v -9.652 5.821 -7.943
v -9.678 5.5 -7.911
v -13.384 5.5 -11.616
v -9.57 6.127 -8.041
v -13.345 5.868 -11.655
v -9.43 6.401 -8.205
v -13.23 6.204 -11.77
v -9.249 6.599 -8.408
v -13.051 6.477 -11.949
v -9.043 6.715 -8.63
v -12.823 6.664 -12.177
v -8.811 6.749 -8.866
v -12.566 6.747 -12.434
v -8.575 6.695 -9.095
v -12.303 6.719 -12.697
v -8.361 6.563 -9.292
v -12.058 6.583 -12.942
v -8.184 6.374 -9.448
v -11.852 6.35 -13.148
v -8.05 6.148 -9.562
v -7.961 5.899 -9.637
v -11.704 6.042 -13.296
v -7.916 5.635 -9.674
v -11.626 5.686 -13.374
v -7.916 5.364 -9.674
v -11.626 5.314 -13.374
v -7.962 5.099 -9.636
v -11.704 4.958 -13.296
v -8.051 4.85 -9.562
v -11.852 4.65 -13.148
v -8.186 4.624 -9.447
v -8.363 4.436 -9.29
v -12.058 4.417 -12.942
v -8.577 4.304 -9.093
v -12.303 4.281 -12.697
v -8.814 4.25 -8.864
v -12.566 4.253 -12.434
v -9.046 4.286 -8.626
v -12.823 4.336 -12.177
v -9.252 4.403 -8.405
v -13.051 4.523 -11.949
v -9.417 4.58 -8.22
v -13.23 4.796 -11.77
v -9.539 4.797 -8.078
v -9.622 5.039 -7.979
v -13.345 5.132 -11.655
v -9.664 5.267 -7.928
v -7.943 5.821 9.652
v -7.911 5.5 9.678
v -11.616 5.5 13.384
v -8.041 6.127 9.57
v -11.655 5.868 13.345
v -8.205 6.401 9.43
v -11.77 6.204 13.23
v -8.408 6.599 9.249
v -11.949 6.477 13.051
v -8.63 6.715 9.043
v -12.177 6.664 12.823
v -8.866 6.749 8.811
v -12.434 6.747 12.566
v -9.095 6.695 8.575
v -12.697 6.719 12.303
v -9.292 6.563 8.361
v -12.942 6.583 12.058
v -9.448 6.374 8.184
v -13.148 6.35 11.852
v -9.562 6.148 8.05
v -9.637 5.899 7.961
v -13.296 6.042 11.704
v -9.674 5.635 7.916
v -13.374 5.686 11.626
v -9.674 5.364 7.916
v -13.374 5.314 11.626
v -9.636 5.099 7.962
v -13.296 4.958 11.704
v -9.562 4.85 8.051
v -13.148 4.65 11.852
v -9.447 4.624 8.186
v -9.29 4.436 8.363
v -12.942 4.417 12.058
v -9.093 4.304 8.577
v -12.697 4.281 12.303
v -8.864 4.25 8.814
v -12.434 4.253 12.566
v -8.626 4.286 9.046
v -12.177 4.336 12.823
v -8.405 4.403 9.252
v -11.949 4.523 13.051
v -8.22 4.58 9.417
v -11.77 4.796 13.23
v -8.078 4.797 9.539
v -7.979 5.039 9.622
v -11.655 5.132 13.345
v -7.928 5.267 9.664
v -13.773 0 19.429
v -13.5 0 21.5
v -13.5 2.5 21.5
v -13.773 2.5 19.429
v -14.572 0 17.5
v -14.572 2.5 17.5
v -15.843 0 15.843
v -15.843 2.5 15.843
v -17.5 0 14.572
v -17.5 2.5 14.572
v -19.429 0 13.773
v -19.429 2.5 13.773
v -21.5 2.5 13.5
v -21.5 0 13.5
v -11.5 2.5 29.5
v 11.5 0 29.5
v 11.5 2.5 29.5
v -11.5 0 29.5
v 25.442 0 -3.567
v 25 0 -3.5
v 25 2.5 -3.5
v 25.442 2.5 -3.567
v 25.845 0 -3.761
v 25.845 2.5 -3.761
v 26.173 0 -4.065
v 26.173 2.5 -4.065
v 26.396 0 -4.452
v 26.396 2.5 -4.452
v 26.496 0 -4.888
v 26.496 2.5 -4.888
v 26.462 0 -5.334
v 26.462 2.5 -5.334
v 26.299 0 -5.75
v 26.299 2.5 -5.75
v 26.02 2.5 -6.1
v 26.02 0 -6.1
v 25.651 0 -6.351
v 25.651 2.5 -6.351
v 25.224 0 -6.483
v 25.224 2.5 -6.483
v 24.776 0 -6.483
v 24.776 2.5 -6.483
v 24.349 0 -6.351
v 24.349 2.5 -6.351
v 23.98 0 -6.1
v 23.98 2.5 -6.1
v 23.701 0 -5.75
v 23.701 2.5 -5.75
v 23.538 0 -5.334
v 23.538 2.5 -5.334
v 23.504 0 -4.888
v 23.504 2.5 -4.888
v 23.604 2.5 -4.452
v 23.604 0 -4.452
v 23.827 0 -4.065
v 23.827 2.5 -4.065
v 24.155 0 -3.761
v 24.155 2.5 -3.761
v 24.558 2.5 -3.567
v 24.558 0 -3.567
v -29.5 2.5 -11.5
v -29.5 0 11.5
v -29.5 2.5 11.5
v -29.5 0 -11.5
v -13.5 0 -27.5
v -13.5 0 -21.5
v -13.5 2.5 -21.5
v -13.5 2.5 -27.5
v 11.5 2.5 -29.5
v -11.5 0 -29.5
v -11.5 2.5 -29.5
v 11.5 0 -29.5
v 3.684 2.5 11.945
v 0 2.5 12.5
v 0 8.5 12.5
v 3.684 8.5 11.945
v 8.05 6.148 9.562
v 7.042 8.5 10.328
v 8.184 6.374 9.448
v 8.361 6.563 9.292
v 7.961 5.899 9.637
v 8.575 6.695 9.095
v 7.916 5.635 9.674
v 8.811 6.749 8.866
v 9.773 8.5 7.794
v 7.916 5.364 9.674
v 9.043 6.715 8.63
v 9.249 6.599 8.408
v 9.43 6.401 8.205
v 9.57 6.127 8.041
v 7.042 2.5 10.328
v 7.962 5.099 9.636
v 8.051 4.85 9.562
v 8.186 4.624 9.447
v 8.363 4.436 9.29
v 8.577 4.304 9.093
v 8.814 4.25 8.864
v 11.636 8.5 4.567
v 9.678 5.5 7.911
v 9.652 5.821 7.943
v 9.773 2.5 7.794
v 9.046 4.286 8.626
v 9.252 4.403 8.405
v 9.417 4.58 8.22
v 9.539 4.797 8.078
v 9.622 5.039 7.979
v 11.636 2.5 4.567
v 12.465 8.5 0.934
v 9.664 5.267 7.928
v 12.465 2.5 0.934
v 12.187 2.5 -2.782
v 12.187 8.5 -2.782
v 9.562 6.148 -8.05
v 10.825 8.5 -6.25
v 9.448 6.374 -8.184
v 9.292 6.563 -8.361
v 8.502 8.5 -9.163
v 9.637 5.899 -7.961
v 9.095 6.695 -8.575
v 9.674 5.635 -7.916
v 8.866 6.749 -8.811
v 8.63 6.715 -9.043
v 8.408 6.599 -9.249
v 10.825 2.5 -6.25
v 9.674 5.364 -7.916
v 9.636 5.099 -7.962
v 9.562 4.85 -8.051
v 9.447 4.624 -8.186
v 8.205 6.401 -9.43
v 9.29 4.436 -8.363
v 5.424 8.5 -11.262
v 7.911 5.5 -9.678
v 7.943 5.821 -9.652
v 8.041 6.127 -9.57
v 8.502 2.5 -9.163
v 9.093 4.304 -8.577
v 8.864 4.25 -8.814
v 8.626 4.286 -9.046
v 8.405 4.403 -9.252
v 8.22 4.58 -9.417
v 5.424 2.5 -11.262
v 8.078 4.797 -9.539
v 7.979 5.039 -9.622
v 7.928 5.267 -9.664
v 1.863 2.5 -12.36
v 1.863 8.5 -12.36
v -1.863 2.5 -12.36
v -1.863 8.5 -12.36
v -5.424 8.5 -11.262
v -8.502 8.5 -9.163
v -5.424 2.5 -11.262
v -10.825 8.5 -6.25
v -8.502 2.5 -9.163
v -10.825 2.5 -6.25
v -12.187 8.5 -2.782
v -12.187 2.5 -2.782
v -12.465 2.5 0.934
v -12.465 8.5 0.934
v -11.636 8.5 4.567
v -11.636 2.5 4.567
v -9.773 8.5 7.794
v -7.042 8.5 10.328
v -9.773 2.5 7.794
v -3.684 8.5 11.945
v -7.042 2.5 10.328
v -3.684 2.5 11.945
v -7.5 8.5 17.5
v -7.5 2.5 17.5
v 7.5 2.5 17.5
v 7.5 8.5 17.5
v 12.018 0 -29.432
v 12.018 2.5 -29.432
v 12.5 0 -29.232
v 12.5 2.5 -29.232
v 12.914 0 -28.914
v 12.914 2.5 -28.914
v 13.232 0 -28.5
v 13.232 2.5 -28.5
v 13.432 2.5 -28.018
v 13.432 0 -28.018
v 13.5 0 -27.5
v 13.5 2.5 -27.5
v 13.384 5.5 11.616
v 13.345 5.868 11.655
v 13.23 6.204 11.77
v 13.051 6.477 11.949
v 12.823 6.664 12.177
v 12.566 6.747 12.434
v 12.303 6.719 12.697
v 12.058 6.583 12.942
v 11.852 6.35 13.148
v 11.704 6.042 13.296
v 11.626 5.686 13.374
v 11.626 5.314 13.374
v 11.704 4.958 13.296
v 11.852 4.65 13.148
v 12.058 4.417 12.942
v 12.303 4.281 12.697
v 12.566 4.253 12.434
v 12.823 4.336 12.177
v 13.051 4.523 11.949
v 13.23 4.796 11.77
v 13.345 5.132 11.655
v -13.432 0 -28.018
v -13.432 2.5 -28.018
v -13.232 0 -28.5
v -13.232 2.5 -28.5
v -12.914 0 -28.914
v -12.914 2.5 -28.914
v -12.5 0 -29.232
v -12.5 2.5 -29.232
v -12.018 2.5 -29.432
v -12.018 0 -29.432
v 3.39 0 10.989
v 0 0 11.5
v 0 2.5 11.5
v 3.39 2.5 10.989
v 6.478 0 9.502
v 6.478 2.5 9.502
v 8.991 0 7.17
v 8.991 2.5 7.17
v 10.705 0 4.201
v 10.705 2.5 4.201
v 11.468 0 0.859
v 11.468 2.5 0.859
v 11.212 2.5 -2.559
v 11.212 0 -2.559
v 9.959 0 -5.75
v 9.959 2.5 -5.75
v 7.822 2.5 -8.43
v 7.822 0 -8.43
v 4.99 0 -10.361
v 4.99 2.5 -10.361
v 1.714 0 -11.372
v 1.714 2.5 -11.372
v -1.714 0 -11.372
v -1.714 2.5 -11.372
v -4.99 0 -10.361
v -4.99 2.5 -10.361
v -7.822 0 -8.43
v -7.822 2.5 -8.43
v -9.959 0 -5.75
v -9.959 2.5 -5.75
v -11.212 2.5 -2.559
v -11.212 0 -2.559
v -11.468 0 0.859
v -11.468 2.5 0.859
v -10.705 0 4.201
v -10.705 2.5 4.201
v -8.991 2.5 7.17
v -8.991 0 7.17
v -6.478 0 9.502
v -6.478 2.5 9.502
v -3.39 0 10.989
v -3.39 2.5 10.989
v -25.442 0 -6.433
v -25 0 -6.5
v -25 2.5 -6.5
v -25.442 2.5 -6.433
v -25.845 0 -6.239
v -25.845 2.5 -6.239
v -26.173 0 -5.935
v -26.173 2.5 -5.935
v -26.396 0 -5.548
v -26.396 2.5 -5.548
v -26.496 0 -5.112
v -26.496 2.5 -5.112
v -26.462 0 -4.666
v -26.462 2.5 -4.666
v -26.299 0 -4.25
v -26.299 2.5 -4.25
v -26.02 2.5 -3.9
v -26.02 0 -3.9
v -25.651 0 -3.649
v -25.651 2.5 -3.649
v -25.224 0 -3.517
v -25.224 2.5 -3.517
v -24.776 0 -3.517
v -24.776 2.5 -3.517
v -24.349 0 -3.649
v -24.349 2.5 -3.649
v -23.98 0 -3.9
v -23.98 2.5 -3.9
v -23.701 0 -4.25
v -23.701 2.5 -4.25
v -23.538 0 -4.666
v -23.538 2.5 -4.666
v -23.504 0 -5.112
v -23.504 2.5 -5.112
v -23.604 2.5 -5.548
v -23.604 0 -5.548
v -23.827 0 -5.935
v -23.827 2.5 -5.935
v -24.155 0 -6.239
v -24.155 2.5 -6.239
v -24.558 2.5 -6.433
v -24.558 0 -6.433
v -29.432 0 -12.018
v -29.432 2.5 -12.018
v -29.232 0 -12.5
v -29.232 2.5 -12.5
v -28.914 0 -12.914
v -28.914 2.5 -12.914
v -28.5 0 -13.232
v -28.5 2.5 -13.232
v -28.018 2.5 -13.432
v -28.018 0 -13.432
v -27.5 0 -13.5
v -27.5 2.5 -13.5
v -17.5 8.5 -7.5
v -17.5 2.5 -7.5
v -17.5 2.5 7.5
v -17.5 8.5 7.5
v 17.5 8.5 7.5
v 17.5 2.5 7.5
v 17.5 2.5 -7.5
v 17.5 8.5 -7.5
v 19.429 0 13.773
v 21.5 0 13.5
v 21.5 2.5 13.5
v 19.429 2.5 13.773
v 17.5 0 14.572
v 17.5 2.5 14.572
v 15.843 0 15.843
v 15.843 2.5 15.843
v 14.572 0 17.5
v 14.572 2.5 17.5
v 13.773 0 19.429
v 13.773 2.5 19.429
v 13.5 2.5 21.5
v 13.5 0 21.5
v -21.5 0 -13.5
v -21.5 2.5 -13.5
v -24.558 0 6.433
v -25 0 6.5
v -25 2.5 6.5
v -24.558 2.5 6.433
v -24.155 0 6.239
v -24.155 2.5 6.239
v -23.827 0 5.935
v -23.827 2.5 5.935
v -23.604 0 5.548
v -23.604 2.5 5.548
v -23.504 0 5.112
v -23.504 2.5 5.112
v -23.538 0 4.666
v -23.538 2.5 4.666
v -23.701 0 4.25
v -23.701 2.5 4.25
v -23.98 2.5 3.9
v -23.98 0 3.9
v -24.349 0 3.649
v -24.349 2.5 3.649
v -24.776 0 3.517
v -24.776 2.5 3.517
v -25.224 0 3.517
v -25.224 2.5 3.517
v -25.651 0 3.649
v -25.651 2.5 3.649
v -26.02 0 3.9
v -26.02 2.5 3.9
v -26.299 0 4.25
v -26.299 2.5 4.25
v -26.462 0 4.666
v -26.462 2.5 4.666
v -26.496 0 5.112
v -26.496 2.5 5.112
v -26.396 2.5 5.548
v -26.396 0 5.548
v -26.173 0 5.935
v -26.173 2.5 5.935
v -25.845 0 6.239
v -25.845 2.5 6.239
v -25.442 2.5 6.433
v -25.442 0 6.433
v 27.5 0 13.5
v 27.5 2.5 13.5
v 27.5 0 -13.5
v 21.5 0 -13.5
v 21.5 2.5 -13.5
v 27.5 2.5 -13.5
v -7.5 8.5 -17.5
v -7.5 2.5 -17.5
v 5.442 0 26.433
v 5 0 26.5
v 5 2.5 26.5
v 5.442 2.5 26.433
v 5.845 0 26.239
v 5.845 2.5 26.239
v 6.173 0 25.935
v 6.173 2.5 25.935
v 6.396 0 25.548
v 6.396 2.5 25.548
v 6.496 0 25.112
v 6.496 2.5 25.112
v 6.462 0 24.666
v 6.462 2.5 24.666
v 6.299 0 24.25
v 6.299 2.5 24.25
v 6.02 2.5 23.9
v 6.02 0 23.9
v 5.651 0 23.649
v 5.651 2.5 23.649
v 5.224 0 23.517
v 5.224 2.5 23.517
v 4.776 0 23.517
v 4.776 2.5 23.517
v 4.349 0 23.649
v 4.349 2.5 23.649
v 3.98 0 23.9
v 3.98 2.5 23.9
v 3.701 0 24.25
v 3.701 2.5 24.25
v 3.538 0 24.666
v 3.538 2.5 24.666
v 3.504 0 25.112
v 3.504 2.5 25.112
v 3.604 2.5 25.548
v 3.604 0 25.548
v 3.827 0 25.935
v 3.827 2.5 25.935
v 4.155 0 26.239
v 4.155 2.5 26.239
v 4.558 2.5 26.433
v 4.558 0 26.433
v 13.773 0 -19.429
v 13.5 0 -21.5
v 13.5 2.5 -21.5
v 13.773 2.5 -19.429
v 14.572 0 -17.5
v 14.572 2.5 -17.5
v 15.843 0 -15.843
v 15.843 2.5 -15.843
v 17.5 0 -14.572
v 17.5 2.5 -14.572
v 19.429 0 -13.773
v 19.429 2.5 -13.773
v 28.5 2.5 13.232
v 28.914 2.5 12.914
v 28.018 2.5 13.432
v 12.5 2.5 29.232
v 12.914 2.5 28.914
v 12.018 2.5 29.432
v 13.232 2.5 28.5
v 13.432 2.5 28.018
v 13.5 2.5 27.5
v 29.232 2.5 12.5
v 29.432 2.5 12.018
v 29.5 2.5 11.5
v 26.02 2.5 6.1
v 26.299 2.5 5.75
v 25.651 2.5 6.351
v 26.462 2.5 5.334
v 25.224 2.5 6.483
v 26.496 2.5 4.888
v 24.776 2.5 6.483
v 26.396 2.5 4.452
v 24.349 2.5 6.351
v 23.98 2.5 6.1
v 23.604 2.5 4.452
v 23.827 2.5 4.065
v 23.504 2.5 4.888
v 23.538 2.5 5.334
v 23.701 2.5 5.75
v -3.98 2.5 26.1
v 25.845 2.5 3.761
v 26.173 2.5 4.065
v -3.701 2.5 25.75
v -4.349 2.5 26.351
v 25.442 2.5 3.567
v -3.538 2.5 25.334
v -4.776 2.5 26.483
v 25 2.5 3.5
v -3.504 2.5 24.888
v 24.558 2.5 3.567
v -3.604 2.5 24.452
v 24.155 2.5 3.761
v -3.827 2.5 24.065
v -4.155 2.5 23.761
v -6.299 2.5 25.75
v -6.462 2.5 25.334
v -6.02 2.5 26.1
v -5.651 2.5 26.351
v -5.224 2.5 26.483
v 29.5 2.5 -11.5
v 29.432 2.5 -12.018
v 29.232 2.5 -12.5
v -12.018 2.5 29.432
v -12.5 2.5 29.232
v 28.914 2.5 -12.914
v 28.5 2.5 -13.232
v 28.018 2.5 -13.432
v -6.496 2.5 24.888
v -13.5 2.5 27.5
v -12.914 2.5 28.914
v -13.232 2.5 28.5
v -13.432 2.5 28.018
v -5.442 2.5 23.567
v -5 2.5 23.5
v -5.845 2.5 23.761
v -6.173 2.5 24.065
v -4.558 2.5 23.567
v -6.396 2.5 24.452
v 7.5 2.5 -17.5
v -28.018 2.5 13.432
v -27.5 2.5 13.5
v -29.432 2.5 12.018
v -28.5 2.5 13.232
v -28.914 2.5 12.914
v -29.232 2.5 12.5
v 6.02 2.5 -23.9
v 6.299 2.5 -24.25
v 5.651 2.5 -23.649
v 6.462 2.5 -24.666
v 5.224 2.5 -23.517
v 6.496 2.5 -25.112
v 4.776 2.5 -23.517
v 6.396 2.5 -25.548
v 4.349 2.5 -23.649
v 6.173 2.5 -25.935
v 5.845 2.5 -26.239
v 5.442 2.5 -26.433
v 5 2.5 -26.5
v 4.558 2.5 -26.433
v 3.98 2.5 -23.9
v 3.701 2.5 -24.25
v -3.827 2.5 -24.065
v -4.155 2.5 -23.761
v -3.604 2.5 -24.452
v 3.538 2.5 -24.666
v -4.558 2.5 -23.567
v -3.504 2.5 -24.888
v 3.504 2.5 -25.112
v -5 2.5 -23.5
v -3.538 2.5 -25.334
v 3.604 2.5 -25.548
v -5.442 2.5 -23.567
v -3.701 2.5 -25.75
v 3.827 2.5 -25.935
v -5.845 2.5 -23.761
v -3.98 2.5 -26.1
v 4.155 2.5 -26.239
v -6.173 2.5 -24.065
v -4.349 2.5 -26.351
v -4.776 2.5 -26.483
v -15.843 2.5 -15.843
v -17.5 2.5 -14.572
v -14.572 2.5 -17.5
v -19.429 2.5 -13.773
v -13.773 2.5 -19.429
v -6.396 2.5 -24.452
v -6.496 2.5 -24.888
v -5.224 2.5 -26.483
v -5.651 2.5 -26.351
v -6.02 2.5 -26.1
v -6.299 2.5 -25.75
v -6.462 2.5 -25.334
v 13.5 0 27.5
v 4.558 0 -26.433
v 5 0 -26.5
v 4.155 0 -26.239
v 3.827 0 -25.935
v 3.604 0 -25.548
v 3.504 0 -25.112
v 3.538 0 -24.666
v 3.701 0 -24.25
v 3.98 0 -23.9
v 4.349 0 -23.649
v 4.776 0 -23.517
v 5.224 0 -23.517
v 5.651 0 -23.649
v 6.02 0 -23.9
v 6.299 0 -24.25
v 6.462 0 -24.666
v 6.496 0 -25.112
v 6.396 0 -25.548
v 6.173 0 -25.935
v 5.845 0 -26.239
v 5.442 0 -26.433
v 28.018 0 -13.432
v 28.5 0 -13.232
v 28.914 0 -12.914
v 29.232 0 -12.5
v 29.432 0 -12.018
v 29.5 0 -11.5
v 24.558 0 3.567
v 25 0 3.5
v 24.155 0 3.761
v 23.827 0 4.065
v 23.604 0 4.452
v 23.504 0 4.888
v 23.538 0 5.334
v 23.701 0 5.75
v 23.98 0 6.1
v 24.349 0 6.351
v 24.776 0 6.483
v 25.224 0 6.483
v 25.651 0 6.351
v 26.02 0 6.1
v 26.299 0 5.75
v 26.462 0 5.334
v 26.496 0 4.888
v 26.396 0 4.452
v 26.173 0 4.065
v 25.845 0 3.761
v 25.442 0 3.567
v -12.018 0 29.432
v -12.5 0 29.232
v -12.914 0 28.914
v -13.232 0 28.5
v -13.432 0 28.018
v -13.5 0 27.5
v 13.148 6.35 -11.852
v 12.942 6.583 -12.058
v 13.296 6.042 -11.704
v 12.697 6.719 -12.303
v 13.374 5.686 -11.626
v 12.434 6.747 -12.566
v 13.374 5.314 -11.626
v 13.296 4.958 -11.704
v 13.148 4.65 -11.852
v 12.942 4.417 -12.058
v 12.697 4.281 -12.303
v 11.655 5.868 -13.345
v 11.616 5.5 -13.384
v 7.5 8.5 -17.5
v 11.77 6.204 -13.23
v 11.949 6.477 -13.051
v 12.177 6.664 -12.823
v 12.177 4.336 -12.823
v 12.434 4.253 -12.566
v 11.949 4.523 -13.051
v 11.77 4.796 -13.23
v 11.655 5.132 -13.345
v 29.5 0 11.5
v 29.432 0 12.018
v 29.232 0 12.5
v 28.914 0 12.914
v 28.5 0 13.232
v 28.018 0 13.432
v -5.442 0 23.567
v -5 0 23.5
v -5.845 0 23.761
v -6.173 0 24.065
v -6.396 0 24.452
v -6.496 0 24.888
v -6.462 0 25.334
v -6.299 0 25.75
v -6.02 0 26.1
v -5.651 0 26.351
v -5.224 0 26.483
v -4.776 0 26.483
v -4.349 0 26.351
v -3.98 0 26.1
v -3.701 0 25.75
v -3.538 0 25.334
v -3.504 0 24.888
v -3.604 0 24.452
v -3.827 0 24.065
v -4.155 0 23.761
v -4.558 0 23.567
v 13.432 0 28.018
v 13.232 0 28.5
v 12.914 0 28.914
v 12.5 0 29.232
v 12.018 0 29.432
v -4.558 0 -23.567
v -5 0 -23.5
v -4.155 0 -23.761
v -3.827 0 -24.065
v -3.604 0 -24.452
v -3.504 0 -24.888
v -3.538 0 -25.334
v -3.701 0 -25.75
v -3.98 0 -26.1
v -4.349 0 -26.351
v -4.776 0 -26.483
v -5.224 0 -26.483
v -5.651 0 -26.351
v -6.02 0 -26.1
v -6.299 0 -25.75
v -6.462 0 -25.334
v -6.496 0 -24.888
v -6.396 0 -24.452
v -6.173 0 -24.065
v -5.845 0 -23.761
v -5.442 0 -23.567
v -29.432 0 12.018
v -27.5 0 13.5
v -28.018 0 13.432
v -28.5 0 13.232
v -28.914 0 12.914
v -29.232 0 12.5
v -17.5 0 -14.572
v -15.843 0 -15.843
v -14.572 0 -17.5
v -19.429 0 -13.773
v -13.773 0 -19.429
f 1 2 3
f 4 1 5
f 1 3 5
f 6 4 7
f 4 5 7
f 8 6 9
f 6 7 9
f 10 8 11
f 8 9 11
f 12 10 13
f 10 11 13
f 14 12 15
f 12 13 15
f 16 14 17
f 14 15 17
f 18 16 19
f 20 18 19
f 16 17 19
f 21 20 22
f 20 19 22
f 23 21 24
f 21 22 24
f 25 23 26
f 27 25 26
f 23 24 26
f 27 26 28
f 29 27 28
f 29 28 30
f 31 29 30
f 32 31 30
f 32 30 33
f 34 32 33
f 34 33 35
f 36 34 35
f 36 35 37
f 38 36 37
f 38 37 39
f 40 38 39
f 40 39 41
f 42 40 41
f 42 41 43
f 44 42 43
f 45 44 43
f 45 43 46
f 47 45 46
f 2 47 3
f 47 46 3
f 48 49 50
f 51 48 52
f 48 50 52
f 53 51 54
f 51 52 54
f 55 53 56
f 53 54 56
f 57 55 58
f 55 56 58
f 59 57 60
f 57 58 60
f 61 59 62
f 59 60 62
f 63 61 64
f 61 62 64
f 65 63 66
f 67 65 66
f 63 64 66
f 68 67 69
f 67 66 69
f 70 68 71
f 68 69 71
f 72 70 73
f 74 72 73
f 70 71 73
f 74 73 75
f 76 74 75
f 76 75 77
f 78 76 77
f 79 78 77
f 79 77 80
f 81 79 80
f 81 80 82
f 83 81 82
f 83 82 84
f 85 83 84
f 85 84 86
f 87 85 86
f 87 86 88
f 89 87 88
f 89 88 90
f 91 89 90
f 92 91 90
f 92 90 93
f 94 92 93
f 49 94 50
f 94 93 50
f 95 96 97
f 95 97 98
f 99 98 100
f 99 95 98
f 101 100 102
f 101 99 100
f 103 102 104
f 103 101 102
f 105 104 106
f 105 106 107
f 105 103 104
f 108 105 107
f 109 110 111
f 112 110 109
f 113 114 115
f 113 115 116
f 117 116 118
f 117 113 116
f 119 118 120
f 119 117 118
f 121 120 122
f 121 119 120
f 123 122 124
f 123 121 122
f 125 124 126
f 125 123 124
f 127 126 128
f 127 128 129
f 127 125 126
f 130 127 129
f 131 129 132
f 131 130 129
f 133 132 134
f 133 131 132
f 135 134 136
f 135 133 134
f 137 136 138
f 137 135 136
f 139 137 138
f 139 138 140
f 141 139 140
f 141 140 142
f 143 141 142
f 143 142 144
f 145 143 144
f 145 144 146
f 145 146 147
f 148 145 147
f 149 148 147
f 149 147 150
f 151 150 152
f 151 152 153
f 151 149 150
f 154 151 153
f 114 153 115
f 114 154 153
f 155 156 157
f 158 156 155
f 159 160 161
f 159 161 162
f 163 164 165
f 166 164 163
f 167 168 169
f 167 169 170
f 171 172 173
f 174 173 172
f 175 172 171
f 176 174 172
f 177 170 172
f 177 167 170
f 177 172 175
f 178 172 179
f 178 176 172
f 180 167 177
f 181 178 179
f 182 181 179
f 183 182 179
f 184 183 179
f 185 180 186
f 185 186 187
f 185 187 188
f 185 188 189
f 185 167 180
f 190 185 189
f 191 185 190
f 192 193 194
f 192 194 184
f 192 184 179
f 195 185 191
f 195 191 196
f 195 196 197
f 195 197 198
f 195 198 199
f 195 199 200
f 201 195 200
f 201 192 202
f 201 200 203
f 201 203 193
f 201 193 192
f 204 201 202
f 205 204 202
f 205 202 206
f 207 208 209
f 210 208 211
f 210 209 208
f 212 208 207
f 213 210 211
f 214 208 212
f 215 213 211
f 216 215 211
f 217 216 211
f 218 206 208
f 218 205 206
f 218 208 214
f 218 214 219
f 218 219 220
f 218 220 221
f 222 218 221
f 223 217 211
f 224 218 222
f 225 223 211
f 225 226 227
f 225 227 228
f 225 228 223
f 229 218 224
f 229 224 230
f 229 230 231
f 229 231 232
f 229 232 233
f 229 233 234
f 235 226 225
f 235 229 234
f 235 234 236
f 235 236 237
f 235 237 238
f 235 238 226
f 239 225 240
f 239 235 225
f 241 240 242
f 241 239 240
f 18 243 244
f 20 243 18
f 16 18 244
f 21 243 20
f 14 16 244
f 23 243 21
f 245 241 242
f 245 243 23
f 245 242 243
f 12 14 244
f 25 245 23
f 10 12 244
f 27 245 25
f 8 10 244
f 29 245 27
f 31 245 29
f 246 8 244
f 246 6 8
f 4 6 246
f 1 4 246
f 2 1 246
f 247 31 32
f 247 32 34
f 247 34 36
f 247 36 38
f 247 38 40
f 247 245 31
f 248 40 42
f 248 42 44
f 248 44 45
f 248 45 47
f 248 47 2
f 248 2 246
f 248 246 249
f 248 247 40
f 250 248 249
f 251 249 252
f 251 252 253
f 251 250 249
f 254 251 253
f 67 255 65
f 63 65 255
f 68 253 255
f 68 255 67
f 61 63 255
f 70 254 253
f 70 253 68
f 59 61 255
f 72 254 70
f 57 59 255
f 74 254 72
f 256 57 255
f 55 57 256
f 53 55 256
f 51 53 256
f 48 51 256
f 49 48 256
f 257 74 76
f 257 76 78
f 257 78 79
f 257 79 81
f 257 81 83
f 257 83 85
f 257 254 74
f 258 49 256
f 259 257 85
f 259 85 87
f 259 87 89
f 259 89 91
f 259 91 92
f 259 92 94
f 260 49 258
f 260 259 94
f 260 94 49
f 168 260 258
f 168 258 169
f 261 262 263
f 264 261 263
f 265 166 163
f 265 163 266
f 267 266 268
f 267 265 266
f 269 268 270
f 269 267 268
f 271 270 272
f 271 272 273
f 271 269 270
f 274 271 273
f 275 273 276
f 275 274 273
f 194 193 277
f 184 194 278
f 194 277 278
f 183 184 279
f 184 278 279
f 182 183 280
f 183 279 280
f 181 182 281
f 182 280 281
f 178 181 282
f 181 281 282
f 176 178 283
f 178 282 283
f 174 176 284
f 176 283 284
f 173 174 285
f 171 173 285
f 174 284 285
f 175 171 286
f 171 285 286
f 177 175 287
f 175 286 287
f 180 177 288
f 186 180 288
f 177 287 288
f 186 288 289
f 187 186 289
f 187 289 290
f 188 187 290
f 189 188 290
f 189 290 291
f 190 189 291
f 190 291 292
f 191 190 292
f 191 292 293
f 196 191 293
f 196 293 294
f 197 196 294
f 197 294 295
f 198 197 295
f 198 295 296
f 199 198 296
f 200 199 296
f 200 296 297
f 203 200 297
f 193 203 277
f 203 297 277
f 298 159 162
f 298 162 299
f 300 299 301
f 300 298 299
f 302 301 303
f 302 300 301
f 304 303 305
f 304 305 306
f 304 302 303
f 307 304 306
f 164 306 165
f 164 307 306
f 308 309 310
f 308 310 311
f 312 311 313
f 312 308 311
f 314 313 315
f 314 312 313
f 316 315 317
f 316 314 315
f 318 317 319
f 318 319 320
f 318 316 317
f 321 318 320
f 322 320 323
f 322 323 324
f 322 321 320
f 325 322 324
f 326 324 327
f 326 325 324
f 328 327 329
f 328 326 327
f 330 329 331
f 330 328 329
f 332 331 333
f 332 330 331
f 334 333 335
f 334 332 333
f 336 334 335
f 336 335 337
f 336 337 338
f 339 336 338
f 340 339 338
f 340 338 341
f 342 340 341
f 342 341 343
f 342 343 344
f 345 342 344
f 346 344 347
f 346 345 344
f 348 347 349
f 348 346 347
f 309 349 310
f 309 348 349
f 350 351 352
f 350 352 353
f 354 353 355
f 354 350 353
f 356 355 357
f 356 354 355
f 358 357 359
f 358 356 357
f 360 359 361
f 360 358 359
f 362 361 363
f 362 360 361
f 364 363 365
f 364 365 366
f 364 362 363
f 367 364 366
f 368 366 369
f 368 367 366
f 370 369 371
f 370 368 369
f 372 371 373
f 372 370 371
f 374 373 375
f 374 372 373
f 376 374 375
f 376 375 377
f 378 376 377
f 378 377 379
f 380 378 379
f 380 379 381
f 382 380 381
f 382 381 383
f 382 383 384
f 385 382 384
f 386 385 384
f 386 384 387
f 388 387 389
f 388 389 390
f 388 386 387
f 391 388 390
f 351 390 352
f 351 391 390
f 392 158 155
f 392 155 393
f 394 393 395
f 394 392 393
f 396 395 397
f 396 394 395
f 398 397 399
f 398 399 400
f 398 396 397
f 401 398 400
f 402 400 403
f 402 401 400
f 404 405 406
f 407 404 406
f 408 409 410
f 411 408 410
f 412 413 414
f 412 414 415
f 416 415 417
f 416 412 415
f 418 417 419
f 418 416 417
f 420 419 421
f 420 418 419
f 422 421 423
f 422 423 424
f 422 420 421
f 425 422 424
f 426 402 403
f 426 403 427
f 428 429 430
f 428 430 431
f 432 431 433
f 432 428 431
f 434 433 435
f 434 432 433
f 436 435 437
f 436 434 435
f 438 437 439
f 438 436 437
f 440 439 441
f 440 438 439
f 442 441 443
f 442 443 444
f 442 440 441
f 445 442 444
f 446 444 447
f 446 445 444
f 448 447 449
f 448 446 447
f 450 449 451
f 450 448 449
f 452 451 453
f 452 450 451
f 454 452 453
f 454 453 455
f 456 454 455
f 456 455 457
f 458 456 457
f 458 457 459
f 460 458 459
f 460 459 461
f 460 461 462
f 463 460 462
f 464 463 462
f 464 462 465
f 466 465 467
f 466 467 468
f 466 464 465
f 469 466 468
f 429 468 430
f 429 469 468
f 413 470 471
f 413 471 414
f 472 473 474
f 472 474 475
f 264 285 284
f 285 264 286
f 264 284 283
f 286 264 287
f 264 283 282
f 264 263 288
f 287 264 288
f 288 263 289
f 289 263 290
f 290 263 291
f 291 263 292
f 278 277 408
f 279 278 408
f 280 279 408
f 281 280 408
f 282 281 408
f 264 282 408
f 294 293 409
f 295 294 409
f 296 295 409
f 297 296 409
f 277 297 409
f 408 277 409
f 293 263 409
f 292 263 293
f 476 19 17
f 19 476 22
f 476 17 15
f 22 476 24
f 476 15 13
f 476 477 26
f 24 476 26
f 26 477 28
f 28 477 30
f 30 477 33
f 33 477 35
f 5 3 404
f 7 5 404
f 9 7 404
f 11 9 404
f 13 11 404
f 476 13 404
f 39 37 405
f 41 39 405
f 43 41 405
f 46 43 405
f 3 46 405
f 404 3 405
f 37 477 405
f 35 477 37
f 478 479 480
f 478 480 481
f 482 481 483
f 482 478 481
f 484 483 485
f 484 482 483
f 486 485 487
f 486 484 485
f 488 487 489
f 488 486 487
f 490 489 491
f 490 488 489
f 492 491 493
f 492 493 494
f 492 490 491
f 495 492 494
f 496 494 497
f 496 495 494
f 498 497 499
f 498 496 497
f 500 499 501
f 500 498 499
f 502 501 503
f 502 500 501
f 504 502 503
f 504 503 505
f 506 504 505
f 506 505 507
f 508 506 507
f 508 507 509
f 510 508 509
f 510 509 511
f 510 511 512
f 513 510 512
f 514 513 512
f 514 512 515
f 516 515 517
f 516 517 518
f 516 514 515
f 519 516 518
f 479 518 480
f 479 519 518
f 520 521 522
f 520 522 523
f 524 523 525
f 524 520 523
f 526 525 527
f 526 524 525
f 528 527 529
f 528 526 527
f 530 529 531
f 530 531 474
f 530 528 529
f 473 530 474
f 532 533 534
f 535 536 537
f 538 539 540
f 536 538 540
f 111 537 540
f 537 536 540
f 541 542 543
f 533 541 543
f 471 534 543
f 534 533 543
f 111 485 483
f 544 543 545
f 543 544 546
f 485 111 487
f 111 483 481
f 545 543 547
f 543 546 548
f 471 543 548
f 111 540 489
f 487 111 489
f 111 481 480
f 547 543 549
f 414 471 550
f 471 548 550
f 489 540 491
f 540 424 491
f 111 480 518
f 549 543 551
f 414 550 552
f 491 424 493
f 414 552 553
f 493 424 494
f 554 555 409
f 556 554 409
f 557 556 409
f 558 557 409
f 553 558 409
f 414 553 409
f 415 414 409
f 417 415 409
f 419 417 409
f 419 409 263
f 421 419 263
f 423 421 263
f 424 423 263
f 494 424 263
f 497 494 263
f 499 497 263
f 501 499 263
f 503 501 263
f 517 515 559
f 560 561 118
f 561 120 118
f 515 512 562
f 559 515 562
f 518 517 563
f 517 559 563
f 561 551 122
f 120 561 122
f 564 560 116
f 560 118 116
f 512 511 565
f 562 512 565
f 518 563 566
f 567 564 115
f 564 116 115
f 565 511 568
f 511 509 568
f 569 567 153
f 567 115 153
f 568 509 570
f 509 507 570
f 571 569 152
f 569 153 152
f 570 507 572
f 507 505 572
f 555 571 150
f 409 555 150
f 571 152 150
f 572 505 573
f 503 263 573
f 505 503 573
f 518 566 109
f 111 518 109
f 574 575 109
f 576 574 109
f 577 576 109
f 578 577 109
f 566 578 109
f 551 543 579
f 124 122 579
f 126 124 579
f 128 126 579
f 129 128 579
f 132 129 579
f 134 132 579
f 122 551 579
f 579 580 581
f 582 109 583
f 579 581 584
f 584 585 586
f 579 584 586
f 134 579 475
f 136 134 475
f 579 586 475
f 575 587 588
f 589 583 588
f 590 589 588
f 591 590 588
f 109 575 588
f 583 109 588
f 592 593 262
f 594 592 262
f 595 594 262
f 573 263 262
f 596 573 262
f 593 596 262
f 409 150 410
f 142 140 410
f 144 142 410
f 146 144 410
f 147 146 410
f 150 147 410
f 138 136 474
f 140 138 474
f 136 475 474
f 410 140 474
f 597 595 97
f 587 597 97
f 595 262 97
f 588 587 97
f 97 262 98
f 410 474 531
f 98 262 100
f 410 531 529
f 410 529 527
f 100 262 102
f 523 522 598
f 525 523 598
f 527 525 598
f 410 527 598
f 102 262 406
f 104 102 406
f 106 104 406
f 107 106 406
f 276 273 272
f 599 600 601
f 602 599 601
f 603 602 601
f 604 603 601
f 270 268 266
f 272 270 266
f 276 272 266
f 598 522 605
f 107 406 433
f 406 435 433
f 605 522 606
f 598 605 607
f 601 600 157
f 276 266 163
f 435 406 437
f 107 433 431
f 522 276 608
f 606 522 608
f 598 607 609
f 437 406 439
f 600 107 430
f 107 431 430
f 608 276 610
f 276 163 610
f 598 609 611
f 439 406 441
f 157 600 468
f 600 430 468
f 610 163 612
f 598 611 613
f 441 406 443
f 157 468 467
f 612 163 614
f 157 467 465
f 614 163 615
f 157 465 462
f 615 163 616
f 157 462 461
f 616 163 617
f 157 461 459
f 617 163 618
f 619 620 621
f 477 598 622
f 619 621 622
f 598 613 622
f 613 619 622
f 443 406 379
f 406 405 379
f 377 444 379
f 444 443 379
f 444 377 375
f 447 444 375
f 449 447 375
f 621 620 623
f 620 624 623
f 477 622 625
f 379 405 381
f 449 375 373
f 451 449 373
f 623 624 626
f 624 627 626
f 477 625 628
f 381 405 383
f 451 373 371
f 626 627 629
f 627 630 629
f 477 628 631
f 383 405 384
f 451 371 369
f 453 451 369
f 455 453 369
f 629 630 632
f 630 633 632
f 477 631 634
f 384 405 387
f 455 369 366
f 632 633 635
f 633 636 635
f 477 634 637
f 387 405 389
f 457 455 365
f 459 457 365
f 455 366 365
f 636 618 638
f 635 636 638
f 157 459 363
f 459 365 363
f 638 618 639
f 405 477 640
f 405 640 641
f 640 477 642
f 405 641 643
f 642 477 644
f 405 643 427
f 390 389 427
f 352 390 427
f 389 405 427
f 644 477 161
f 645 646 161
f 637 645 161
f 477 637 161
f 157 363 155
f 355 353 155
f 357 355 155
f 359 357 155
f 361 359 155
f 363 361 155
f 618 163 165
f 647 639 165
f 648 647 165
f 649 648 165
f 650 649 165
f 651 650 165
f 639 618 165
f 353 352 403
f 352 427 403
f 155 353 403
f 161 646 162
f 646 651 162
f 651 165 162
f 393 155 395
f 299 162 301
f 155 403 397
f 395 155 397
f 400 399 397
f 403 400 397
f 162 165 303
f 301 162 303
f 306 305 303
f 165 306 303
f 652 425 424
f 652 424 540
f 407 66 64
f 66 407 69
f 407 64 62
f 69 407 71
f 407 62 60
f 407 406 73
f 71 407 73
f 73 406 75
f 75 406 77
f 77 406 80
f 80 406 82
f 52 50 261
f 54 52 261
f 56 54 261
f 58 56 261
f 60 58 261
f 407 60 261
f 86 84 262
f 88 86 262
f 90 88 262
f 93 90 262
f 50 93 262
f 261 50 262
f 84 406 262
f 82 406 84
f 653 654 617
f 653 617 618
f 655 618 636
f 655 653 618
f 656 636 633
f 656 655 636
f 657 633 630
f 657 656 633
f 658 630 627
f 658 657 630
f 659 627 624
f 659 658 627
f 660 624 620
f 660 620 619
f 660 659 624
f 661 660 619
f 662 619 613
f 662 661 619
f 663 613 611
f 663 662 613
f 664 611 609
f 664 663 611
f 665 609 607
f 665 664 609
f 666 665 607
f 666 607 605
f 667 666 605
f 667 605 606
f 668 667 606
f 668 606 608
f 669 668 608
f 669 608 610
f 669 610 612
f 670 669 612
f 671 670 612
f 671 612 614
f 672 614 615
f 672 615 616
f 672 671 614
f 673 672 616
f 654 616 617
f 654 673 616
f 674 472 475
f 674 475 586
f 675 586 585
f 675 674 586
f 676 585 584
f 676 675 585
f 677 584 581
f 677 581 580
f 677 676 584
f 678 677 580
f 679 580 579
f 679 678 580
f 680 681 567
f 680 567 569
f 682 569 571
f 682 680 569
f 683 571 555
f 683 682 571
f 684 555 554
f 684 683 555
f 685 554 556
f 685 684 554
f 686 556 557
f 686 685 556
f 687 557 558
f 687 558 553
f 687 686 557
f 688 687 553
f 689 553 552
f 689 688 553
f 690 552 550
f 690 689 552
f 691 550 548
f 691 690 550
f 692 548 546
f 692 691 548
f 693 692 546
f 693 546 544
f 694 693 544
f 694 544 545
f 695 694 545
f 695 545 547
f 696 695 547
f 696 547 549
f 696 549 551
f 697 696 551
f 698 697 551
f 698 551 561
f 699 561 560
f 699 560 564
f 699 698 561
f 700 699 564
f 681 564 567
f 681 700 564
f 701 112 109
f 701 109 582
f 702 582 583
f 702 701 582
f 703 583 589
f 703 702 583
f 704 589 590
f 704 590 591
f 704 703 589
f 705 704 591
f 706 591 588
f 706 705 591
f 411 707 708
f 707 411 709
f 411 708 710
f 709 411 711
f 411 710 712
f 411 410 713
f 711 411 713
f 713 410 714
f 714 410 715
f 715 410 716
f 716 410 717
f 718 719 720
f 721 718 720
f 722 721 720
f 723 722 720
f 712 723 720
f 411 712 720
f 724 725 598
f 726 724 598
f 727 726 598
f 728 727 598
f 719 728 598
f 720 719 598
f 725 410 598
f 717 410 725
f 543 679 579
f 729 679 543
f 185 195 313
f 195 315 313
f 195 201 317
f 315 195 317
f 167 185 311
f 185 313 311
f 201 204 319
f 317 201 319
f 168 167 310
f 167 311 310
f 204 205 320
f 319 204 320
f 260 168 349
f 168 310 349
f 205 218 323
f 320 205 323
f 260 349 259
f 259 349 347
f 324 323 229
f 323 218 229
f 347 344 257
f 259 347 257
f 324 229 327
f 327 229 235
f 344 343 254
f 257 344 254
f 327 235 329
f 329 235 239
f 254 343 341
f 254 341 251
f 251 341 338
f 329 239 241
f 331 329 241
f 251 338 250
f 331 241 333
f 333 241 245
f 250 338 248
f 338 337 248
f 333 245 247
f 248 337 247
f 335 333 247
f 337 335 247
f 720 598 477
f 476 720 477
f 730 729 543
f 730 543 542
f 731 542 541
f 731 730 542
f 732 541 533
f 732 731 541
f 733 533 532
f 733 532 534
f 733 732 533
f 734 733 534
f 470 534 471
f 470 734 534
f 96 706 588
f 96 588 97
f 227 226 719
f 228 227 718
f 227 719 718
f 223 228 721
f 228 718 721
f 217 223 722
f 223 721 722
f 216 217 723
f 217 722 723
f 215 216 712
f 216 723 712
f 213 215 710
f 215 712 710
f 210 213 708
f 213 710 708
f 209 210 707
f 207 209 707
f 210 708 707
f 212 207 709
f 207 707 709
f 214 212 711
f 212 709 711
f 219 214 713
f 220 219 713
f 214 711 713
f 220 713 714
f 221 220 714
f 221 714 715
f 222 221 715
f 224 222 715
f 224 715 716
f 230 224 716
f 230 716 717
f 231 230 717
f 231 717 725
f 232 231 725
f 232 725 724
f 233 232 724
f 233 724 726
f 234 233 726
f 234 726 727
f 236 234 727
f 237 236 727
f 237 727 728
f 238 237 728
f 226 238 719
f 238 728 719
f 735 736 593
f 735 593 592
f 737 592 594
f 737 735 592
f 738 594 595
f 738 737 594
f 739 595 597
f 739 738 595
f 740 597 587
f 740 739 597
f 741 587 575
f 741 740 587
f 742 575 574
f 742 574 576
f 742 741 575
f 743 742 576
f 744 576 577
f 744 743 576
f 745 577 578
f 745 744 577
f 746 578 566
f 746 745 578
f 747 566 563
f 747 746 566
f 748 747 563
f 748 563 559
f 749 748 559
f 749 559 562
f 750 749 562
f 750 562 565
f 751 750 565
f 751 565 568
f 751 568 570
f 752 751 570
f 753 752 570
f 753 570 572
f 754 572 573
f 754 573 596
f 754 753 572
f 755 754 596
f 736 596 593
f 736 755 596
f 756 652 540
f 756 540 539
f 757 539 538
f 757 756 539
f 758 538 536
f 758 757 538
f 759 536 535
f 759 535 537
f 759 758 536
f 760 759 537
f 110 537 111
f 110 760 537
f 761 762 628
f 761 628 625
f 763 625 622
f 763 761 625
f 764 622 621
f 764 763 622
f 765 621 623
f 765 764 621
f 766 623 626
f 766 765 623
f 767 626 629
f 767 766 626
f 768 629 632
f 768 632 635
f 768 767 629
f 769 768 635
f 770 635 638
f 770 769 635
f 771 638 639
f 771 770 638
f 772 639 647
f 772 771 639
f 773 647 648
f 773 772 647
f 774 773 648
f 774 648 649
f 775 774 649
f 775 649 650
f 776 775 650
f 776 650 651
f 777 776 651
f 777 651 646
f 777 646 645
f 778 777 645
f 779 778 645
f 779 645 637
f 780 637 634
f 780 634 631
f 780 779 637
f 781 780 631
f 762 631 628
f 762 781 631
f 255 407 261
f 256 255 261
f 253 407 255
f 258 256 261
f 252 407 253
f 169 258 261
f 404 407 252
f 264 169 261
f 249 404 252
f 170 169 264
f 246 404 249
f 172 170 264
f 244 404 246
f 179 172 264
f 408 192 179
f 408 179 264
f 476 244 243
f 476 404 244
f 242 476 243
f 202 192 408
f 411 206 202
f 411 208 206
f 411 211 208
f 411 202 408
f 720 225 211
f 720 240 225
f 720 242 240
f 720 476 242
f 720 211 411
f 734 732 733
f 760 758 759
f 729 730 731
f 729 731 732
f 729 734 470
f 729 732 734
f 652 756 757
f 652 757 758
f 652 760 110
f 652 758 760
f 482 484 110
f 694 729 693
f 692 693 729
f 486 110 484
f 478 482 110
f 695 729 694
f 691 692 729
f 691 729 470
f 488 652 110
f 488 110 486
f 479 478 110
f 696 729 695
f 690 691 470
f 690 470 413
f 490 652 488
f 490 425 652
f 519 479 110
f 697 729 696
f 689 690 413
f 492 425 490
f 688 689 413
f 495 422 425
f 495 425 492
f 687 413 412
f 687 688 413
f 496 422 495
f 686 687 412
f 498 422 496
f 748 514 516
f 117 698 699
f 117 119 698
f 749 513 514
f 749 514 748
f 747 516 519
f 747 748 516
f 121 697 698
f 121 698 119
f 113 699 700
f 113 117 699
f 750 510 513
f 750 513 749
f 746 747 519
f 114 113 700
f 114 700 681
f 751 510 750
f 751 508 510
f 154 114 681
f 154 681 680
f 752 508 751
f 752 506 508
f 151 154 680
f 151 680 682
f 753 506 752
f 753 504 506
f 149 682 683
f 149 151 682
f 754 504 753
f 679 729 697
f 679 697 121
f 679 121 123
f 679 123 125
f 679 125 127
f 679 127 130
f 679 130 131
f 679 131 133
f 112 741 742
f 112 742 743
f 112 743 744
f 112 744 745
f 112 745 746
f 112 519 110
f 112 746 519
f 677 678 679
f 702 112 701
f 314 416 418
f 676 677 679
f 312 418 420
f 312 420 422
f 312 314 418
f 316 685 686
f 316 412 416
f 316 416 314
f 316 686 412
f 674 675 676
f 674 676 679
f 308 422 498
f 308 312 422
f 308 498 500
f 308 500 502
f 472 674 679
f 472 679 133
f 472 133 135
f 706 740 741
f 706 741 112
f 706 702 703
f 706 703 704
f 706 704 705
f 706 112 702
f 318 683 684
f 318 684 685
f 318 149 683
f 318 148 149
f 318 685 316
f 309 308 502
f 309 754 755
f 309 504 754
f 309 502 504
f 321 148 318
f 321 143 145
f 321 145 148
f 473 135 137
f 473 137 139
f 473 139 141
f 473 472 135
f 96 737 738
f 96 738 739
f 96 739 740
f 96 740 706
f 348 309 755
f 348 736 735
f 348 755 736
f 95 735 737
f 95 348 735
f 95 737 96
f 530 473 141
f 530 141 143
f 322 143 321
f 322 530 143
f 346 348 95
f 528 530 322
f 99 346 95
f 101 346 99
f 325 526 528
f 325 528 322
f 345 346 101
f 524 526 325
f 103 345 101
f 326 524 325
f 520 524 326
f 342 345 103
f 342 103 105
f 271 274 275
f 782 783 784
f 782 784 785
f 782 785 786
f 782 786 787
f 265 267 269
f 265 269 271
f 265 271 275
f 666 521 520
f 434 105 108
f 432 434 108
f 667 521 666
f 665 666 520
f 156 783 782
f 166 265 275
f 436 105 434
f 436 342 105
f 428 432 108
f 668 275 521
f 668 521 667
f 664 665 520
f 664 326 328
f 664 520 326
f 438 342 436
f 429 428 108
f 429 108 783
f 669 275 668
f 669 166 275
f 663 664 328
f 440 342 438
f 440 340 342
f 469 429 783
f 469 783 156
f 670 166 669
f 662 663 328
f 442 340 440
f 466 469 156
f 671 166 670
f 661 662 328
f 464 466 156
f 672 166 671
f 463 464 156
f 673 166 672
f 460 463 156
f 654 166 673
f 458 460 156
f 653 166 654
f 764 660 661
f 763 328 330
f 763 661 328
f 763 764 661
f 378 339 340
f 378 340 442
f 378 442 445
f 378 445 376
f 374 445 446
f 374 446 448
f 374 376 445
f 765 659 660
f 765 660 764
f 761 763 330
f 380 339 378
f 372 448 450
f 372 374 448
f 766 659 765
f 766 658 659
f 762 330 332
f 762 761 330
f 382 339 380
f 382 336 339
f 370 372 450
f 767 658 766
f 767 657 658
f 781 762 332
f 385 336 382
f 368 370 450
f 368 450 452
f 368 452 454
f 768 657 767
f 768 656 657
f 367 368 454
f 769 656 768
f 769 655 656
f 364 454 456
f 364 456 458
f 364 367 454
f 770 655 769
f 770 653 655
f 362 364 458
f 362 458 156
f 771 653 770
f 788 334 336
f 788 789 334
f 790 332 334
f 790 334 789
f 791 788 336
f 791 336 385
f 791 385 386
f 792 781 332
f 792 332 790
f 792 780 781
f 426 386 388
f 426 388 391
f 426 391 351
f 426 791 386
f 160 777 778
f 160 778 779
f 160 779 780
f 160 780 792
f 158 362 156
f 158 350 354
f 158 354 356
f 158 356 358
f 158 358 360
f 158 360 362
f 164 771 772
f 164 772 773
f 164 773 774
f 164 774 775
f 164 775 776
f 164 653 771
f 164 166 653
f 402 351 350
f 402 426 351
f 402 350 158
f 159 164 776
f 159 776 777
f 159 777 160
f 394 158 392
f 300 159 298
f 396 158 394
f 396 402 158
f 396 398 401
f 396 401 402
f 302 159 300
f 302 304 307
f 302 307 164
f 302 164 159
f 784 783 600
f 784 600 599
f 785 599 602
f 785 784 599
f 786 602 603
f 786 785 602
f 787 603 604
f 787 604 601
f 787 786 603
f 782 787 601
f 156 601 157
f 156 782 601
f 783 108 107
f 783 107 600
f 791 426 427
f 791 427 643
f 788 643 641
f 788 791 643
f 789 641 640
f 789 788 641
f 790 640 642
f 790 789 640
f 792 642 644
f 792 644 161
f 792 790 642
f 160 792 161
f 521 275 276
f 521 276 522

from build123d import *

# Parameters (mm, degrees)
SKETCH_1_R               = 11.5
SKETCH_1_R_2             = 1.5
EXTRUDE_1_DEPTH          = 2.5
SKETCH_2_R               = 12.5
EXTRUDE_2_DEPTH          = 6
HOLE_WIZARD_M3_1_REACH   = 61.651
HOLE_WIZARD_M3_1_BORE_R  = 1.25
PATTERN_CIRCULAR_1_COUNT = 4


with BuildPart() as part:
    # 草图1 → 凸台-拉伸1 (new body)
    with BuildSketch(Plane(origin=(0, 0, 0), x_dir=(1, 0, 0), z_dir=(0, 1, 0))):
        with BuildLine():
            Line((-11.5, 29.5), (11.5, 29.5))
            ThreePointArc((11.5, 29.5), (12.914213562, 28.914213562), (13.5, 27.5))
            Line((13.5, 27.5), (13.5, 21.5))
            ThreePointArc((13.5, 21.5), (15.843145751, 15.843145751), (21.5, 13.5))
            Line((21.5, 13.5), (27.5, 13.5))
            ThreePointArc((27.5, 13.5), (28.914213562, 12.914213562), (29.5, 11.5))
            Line((29.5, 11.5), (29.5, -11.5))
            ThreePointArc((29.5, -11.5), (28.914213562, -12.914213562), (27.5, -13.5))
            Line((27.5, -13.5), (21.5, -13.5))
            ThreePointArc((21.5, -13.5), (15.843145751, -15.843145751), (13.5, -21.5))
            Line((13.5, -21.5), (13.5, -27.5))
            ThreePointArc((13.5, -27.5), (12.914213562, -28.914213562), (11.5, -29.5))
            Line((11.5, -29.5), (-11.5, -29.5))
            ThreePointArc((-11.5, -29.5), (-12.914213562, -28.914213562), (-13.5, -27.5))
            Line((-13.5, -27.5), (-13.5, -21.5))
            ThreePointArc((-13.5, -21.5), (-15.843145751, -15.843145751), (-21.5, -13.5))
            Line((-21.5, -13.5), (-27.5, -13.5))
            ThreePointArc((-27.5, -13.5), (-28.914213562, -12.914213562), (-29.5, -11.5))
            Line((-29.5, -11.5), (-29.5, 11.5))
            ThreePointArc((-29.5, 11.5), (-28.914213562, 12.914213562), (-27.5, 13.5))
            Line((-27.5, 13.5), (-21.5, 13.5))
            ThreePointArc((-21.5, 13.5), (-15.843145751, 15.843145751), (-13.5, 21.5))
            Line((-13.5, 21.5), (-13.5, 27.5))
            ThreePointArc((-13.5, 27.5), (-12.914213562, 28.914213562), (-11.5, 29.5))
        make_face()
        with Locations(Location((0, 0, 0), (0, 0, 270))):
            Circle(SKETCH_1_R, mode=Mode.SUBTRACT)
        with Locations(Location((-5, 25, 0), (0, 0, 270))):
            Circle(SKETCH_1_R_2, mode=Mode.SUBTRACT)
        with Locations(Location((5, 25, 0), (0, 0, 90))):
            Circle(SKETCH_1_R_2, mode=Mode.SUBTRACT)
        with Locations(Location((25, 5, 0), (0, 0, 270))):
            Circle(SKETCH_1_R_2, mode=Mode.SUBTRACT)
        with Locations(Location((25, -5, 0), (0, 0, 90))):
            Circle(SKETCH_1_R_2, mode=Mode.SUBTRACT)
        with Locations(Location((5, -25, 0), (0, 0, 270))):
            Circle(SKETCH_1_R_2, mode=Mode.SUBTRACT)
        with Locations(Location((-5, -25, 0), (0, 0, 90))):
            Circle(SKETCH_1_R_2, mode=Mode.SUBTRACT)
        with Locations(Location((-25, -5, 0), (0, 0, 270))):
            Circle(SKETCH_1_R_2, mode=Mode.SUBTRACT)
        with Locations(Location((-25, 5, 0), (0, 0, 90))):
            Circle(SKETCH_1_R_2, mode=Mode.SUBTRACT)
    extrude(amount=EXTRUDE_1_DEPTH)

    # 草图2 → 凸台-拉伸2 (add)
    with BuildSketch(Plane(origin=(0, 2.5, 0), x_dir=(1, 0, 0), z_dir=(0, 1, 0))):
        Polygon((17.5, 7.5), (7.5, 17.5), (-7.5, 17.5), (-17.5, 7.5), (-17.5, -7.5), (-7.5, -17.5), (7.5, -17.5), (17.5, -7.5), align=None)
        with Locations(Location((0, 0, 0), (0, 0, 270))):
            Circle(SKETCH_2_R, mode=Mode.SUBTRACT)
    extrude(amount=EXTRUDE_2_DEPTH)

    # M3 螺纹孔1 bore (on position points) → M3 螺纹孔1 (cut, up to next)
    with BuildSketch(Plane(origin=(-12.5, 5.5, 12.5), x_dir=(0.707106781187, 0, 0.707106781187), z_dir=(-0.707106781187, 0, 0.707106781187)), mode=Mode.PRIVATE) as hole_wizard_m3_1_sk1:
        Circle(HOLE_WIZARD_M3_1_BORE_R)
    hole_wizard_m3_1_tool1 = extrude(hole_wizard_m3_1_sk1.sketch, amount=-HOLE_WIZARD_M3_1_REACH, mode=Mode.PRIVATE) & part.part
    hole_wizard_m3_1 = hole_wizard_m3_1_tool1.solids().sort_by_distance((-12.5, 5.5, 12.5))[0]
    add(hole_wizard_m3_1, mode=Mode.SUBTRACT)

    # 阵列(圆周)1: M3 螺纹孔1 ×4 about axis
    pattern_circular_1_axis = Axis((0, 8.5, 0), (0, -1, 0))
    for i in range(1, PATTERN_CIRCULAR_1_COUNT):
        add(hole_wizard_m3_1.rotate(pattern_circular_1_axis, i * 360 / PATTERN_CIRCULAR_1_COUNT), mode=Mode.SUBTRACT)


solid = part.part
